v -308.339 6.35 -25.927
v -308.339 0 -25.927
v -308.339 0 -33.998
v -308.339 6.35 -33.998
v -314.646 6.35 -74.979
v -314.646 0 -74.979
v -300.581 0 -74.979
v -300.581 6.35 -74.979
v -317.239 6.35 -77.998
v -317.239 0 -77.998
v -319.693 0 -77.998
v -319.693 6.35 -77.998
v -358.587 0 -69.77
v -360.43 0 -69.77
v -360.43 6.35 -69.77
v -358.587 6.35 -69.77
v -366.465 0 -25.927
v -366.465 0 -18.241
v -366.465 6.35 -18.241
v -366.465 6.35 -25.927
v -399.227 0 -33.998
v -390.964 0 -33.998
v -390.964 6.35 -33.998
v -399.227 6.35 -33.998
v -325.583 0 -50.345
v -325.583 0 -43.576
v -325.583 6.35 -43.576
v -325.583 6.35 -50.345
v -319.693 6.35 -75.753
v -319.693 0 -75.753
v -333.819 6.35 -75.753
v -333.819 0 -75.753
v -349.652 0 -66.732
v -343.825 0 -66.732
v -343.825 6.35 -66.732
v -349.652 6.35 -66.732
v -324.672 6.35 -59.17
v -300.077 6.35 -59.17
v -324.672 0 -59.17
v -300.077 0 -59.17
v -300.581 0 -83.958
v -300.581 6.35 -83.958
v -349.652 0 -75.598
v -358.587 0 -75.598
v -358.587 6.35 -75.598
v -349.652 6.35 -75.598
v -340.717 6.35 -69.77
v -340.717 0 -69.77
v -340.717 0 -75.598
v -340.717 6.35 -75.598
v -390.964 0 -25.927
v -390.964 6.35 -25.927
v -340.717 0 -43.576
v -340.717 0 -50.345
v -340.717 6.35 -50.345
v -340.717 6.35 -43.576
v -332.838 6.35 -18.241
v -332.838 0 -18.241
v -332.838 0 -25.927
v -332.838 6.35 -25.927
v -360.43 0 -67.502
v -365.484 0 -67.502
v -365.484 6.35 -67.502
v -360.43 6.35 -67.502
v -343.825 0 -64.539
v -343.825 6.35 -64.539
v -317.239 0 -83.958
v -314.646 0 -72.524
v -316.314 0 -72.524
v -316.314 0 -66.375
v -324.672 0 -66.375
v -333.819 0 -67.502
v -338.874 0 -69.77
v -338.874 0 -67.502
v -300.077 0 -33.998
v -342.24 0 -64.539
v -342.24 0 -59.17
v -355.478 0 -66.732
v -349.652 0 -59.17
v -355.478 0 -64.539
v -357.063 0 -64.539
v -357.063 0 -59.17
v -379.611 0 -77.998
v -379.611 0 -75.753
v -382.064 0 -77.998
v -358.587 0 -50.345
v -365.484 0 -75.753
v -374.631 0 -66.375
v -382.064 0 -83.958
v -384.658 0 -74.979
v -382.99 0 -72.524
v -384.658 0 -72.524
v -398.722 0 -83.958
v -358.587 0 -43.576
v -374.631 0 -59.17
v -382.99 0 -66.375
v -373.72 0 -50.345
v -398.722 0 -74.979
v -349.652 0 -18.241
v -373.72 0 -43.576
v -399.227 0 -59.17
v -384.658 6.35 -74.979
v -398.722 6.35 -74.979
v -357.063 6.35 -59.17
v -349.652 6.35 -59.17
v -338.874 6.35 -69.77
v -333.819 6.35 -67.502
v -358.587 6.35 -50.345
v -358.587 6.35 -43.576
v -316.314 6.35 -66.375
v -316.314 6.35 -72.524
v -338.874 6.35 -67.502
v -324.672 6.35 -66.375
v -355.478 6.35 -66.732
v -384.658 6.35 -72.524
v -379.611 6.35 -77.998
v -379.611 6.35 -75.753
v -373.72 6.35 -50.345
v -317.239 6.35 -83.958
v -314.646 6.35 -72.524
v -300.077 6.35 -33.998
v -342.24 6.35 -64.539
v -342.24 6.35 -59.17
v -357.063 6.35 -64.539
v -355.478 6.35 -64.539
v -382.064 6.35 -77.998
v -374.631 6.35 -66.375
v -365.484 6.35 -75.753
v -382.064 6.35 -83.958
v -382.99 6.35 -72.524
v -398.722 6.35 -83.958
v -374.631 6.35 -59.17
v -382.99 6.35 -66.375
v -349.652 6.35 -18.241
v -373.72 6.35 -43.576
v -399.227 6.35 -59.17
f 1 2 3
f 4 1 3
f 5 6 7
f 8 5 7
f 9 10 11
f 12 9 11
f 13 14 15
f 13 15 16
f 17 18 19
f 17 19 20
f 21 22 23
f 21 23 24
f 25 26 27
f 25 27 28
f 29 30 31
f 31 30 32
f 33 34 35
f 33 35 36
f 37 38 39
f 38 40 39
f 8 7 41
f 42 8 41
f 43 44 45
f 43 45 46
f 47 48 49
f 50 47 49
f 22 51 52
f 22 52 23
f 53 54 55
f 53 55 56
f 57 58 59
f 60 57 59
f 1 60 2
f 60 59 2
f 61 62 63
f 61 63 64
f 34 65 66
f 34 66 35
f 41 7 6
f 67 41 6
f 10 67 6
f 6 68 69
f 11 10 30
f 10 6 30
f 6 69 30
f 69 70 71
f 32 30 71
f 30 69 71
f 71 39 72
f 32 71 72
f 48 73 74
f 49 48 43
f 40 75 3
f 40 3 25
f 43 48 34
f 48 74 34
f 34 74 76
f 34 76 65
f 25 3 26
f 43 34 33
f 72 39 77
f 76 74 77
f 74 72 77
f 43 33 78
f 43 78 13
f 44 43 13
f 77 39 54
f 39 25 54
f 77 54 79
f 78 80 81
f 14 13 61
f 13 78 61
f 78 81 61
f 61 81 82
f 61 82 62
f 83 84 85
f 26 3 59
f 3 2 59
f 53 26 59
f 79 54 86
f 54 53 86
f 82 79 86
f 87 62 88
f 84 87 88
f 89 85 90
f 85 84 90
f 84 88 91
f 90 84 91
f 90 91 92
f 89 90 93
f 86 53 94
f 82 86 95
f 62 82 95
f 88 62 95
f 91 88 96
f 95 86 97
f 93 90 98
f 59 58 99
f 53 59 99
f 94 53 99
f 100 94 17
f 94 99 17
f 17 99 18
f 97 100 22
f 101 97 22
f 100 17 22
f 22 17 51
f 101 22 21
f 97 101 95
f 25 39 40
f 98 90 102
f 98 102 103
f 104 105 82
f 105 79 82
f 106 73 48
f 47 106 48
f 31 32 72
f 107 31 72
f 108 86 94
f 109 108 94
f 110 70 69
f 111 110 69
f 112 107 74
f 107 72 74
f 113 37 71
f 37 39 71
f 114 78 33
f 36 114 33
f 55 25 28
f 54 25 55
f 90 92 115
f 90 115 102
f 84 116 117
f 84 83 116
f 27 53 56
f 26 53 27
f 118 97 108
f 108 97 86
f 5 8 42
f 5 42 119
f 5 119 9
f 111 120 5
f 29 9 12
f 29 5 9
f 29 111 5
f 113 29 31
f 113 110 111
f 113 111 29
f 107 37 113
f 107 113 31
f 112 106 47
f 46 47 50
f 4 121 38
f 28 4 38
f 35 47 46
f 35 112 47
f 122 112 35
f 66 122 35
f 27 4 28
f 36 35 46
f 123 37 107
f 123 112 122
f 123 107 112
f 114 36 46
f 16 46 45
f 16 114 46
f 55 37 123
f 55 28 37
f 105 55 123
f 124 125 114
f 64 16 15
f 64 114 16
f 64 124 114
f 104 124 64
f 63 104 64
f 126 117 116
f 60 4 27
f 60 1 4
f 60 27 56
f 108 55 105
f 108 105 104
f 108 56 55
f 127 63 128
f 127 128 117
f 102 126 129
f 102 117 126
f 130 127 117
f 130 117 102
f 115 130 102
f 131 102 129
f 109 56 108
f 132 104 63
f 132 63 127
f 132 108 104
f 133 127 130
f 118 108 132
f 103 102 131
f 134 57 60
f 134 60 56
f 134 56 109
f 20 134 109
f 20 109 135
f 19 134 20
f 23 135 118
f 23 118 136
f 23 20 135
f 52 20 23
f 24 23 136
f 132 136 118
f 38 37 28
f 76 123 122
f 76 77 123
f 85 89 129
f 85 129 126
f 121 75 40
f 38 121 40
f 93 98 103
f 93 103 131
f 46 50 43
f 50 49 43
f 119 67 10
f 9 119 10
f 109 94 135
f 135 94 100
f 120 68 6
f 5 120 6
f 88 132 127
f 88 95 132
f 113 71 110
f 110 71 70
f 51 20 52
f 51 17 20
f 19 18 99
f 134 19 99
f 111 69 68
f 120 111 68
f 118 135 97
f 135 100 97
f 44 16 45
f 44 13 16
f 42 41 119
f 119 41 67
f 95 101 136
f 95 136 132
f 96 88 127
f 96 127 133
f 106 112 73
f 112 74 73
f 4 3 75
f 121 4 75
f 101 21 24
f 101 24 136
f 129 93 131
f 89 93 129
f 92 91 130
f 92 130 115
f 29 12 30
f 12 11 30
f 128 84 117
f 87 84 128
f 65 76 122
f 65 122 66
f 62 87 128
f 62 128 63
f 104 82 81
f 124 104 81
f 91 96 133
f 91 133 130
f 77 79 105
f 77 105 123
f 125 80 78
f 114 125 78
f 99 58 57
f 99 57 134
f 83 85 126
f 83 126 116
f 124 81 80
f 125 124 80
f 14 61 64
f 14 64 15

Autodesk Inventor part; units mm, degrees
ref_plane "YZ Plane" through (0, 0, 0) normal (1, 0, 0) x (0, 1, 0)
ref_plane "XZ Plane" through (0, 0, 0) normal (0, 1, 0) x (-1, 0, 0)
ref_plane "XY Plane" through (0, 0, 0) normal (0, 0, 1) x (1, 0, 0)
sketch "Sketch1" plane through (0, 0, 0) normal (0, 1, 0) x (-1, 0, 0)
  line L0 (0, 0) -> (426.7814, 0) construction
  line L1 (426.7814, 0) -> (426.7814, -191.0355) construction
  line L2 (426.7814, -191.0355) -> (0, -191.0355) construction
  line L3 (0, -191.0355) -> (0, 0) construction
  line L4 (332.8385, -18.2414) -> (332.8385, -25.9274)
  line L5 (332.8385, -25.9274) -> (308.3392, -25.9274)
  line L6 (308.3392, -25.9274) -> (308.3392, -33.9978)
  line L7 (308.3392, -33.9978) -> (300.0767, -33.9978)
  line L8 (300.0767, -33.9978) -> (300.0767, -59.1696)
  line L9 (300.0767, -59.1696) -> (324.672, -59.1696)
  line L10 (324.672, -59.1696) -> (324.672, -66.3753)
  line L11 (324.672, -66.3753) -> (316.3135, -66.3753)
  line L12 (316.3135, -66.3753) -> (316.3135, -72.5241)
  line L13 (316.3135, -72.5241) -> (314.6458, -72.5241)
  line L14 (314.6458, -72.5241) -> (314.6458, -74.979)
  line L15 (314.6458, -74.979) -> (300.5812, -74.979)
  line L16 (300.5812, -74.979) -> (300.5812, -83.958)
  line L17 (300.5812, -83.958) -> (317.2389, -83.958)
  line L18 (317.2389, -83.958) -> (317.2389, -77.9978)
  line L19 (317.2389, -77.9978) -> (319.6927, -77.9978)
  line L20 (319.6927, -77.9978) -> (319.6927, -75.753)
  line L21 (319.6927, -75.753) -> (333.8192, -75.753)
  line L22 (333.8192, -75.753) -> (333.8192, -67.5016)
  line L23 (333.8192, -67.5016) -> (338.8738, -67.5016)
  line L24 (338.8738, -67.5016) -> (338.8738, -69.7696)
  line L25 (338.8738, -69.7696) -> (340.7167, -69.7696)
  line L26 (340.7167, -69.7696) -> (340.7167, -75.5985)
  line L27 (349.6517, -59.1696) -> (342.2405, -59.1696)
  line L28 (342.2405, -59.1696) -> (342.2405, -64.5393)
  line L29 (342.2405, -64.5393) -> (343.8251, -64.5393)
  line L30 (343.8251, -64.5393) -> (343.8251, -66.7322)
  line L31 (343.8251, -66.7322) -> (349.6517, -66.7322)
  line L32 (325.5834, -43.5764) -> (325.5834, -50.3454)
  line L33 (325.5834, -50.3454) -> (340.7167, -50.3454)
  line L34 (340.7167, -50.3454) -> (340.7167, -43.5764)
  line L35 (340.7167, -43.5764) -> (325.5834, -43.5764)
  line L36 (340.7167, -75.5985) -> (349.6517, -75.5985)
  line L37 (332.8385, -18.2414) -> (349.6517, -18.2414)
  line L38 (366.4649, -18.2414) -> (366.4649, -25.9274)
  line L39 (366.4649, -25.9274) -> (390.9642, -25.9274)
  line L40 (390.9642, -25.9274) -> (390.9642, -33.9978)
  line L41 (390.9642, -33.9978) -> (399.2267, -33.9978)
  line L42 (399.2267, -33.9978) -> (399.2267, -59.1696)
  line L43 (399.2267, -59.1696) -> (374.6314, -59.1696)
  line L44 (374.6314, -59.1696) -> (374.6314, -66.3753)
  line L45 (374.6314, -66.3753) -> (382.9899, -66.3753)
  line L46 (382.9899, -66.3753) -> (382.9899, -72.5241)
  line L47 (382.9899, -72.5241) -> (384.6575, -72.5241)
  line L48 (384.6575, -72.5241) -> (384.6575, -74.979)
  line L49 (384.6575, -74.979) -> (398.7222, -74.979)
  line L50 (398.7222, -74.979) -> (398.7222, -83.958)
  line L51 (398.7222, -83.958) -> (382.0645, -83.958)
  line L52 (382.0645, -83.958) -> (382.0645, -77.9978)
  line L53 (382.0645, -77.9978) -> (379.6107, -77.9978)
  line L54 (379.6107, -77.9978) -> (379.6107, -75.753)
  line L55 (379.6107, -75.753) -> (365.4842, -75.753)
  line L56 (365.4842, -75.753) -> (365.4842, -67.5016)
  line L57 (365.4842, -67.5016) -> (360.4296, -67.5016)
  line L58 (360.4296, -67.5016) -> (360.4296, -69.7696)
  line L59 (360.4296, -69.7696) -> (358.5867, -69.7696)
  line L60 (358.5867, -69.7696) -> (358.5867, -75.5985)
  line L61 (349.6517, -59.1696) -> (357.0629, -59.1696)
  line L62 (357.0629, -59.1696) -> (357.0629, -64.5393)
  line L63 (357.0629, -64.5393) -> (355.4783, -64.5393)
  line L64 (355.4783, -64.5393) -> (355.4783, -66.7322)
  line L65 (355.4783, -66.7322) -> (349.6517, -66.7322)
  line L66 (373.72, -43.5764) -> (373.72, -50.3454)
  line L67 (373.72, -50.3454) -> (358.5867, -50.3454)
  line L68 (358.5867, -50.3454) -> (358.5867, -43.5764)
  line L69 (358.5867, -43.5764) -> (373.72, -43.5764)
  line L70 (358.5867, -75.5985) -> (349.6517, -75.5985)
  line L71 (366.4649, -18.2414) -> (349.6517, -18.2414)
  dimension "d24" = 25.5068
extrude "Extrusion1" add sketch "Sketch1" along normal blind 6.35
properties part number "Monster5"
